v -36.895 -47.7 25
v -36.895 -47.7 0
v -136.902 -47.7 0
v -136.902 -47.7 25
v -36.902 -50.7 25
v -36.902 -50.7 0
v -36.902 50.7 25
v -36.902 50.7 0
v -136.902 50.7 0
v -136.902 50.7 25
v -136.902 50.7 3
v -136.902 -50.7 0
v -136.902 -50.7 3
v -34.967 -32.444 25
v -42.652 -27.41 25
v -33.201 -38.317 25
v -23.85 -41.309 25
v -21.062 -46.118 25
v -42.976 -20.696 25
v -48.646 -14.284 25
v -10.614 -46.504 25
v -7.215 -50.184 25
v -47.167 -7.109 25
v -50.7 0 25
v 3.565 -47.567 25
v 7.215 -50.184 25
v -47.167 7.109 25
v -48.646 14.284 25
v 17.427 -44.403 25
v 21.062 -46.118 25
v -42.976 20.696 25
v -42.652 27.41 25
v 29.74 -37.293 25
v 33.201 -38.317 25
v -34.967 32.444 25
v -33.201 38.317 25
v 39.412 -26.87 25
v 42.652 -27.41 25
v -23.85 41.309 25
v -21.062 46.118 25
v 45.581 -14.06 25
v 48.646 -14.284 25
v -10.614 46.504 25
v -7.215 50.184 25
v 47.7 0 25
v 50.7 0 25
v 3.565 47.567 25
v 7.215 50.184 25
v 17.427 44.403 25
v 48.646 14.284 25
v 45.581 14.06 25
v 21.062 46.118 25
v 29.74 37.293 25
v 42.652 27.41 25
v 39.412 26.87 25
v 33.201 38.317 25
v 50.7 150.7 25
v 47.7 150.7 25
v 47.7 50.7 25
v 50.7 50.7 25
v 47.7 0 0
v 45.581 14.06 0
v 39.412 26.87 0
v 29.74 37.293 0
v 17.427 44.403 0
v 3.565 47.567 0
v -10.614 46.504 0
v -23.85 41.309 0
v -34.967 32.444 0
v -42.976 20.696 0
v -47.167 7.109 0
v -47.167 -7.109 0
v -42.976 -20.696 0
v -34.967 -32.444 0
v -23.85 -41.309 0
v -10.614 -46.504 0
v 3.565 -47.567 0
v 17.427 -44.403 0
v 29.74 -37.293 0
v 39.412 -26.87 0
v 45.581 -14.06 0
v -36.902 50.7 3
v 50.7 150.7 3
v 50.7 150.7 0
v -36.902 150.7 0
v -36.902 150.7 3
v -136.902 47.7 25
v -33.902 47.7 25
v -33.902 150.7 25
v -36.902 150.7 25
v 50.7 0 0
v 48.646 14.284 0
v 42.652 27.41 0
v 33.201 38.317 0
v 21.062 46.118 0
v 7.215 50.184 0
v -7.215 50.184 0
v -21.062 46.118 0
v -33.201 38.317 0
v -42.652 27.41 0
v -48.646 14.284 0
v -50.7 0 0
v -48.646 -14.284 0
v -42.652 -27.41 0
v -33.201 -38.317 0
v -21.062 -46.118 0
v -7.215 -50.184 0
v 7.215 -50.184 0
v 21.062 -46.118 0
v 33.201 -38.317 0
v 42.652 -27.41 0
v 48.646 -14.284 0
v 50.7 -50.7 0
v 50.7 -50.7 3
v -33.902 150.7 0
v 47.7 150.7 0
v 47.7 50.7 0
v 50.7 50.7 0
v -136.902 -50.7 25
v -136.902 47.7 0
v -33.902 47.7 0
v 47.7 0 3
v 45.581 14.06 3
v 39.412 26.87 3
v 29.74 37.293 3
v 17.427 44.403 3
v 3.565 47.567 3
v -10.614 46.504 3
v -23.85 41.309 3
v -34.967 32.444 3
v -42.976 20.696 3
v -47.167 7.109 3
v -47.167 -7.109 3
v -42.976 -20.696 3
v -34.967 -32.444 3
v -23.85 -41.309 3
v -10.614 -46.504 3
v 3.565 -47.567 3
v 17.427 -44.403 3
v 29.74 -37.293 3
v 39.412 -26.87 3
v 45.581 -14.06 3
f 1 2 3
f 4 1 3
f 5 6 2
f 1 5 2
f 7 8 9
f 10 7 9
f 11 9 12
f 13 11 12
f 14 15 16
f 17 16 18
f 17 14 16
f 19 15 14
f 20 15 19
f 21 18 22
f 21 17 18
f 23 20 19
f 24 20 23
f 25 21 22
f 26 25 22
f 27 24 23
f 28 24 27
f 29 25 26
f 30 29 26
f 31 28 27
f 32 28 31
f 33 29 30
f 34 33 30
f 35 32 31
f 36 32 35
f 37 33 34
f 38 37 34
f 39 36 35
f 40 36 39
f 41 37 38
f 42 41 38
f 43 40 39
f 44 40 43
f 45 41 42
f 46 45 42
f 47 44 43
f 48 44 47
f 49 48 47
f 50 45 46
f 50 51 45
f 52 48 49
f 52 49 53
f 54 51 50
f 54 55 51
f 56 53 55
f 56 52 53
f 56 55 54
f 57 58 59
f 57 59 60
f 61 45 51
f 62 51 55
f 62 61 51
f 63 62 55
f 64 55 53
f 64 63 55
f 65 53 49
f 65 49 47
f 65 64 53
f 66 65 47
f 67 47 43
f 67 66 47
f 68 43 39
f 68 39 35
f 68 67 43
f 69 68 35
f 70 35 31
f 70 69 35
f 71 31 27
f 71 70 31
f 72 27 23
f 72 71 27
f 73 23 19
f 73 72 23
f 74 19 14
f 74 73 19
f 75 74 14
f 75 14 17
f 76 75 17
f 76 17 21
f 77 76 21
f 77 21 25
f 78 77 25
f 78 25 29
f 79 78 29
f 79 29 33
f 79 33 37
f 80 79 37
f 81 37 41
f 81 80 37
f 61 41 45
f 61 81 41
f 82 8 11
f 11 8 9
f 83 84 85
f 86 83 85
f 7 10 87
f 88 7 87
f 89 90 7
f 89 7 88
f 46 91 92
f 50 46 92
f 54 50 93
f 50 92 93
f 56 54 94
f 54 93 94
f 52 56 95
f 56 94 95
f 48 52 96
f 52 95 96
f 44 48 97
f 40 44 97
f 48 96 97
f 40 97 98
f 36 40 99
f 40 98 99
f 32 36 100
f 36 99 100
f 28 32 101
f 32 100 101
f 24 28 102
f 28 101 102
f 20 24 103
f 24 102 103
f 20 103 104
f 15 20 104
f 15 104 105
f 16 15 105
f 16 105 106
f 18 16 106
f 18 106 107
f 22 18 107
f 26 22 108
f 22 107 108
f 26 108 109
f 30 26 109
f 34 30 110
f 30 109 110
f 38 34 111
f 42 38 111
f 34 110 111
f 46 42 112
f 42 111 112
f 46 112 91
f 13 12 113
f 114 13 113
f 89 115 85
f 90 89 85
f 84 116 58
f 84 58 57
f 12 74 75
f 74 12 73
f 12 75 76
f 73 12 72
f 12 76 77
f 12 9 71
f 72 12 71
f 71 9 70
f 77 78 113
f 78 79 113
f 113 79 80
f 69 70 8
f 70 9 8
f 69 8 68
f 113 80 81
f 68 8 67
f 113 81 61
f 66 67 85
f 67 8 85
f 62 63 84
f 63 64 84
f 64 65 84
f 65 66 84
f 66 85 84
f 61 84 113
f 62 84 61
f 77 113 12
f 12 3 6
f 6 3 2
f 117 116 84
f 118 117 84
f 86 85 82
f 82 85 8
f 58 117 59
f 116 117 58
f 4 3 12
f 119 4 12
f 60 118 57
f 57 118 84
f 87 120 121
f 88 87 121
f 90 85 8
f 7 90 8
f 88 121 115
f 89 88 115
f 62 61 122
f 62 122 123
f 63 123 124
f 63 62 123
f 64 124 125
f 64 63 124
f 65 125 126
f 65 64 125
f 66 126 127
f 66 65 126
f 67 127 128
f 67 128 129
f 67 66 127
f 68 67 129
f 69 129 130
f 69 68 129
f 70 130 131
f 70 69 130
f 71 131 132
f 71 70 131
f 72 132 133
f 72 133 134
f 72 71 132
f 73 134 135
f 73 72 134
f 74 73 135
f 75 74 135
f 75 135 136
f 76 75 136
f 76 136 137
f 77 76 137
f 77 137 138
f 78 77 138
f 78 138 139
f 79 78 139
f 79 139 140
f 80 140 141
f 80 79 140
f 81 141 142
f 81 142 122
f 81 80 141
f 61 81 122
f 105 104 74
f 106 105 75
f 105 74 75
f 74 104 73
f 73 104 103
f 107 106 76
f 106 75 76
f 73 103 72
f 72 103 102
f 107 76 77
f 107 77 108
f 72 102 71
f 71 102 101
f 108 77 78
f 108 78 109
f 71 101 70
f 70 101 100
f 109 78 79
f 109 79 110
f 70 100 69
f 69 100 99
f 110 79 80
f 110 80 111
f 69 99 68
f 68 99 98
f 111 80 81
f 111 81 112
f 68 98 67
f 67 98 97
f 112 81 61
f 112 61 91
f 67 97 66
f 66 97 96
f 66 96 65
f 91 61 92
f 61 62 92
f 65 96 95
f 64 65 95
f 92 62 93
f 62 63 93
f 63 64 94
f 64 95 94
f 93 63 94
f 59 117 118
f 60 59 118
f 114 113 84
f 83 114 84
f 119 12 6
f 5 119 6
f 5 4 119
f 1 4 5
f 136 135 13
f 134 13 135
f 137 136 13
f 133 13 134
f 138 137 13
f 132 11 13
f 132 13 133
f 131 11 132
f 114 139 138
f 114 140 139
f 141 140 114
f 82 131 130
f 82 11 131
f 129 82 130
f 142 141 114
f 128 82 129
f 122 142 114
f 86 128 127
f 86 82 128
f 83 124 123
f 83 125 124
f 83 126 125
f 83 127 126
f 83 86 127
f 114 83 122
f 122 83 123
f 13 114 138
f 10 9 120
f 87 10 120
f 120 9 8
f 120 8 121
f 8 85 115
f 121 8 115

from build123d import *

# Parameters (mm, degrees)
F0_R     = 47.7
F1_DEPTH = 25
F0_W     = 3
F0_H     = 100
F2_DEPTH = 3


with BuildPart() as f1:
    # F0 (on Top) → F1 (new body)
    with BuildSketch(Plane.XY):
        with BuildLine():
            ThreePointArc((-4.79e-08, -50.7), (35.8503137892, -35.8503138231), (50.7, 0))
            ThreePointArc((50.7, 0), (-35.8503137892, 35.8503138231), (-4.79e-08, -50.7))
        make_face()
        Circle(F0_R, mode=Mode.SUBTRACT)
    extrude(amount=F1_DEPTH)


with BuildPart() as f1b:
    # F0 (on Top) → F1, piece 2 (new body)
    with BuildSketch(Plane.XY):
        Polygon((-33.9021371007, 47.7000079251), (-33.9021371007, 150.7), (-36.9021371007, 150.7), (-36.9021371007, 50.7), (-136.9021371007, 50.7), (-136.9021371007, 47.7000079251), (-36.8952414091, 47.7000079251), align=None)
    extrude(amount=F1_DEPTH)


with BuildPart() as f1c:
    # F0 (on Top) → F1, piece 3 (new body)
    with BuildSketch(Plane.XY):
        with Locations((49.2, 100.7)):
            Rectangle(F0_W, F0_H)
    extrude(amount=F1_DEPTH)


with BuildPart() as f1d:
    # F0 (on Top) → F1, piece 4 (new body)
    with BuildSketch(Plane.XY):
        Polygon((-136.9021371007, -50.7), (-36.9021371007, -50.7), (-36.8952414091, -47.7000079251), (-136.9021371007, -47.7000079251), align=None)
    extrude(amount=F1_DEPTH)


with BuildPart() as f2:
    # F0 (on Top) → F2 (new body)
    with BuildSketch(Plane.XY):
        with BuildLine():
            ThreePointArc((-4.79e-08, -50.7), (35.8503137892, -35.8503138231), (50.7, 0))
            ThreePointArc((50.7, 0), (-35.8503137892, 35.8503138231), (-4.79e-08, -50.7))
        make_face()
        Circle(F0_R, mode=Mode.SUBTRACT)
        with BuildLine():
            Line((50.7, -50.7), (50.7, 0))
            ThreePointArc((50.7, 0), (35.8503137892, -35.8503138231), (-4.79e-08, -50.7))
            Line((-4.79e-08, -50.7), (50.7, -50.7))
        make_face()
        with BuildLine():
            ThreePointArc((-4.79e-08, -50.7), (-35.8503137892, 35.8503138231), (50.7, 0))
            Line((50.7, 0), (50.7, 50.7))
            Line((50.7, 50.7), (47.7, 50.7))
            Line((47.7, 50.7), (47.7, 150.7))
            Line((47.7, 150.7), (-33.9021371007, 150.7))
            Line((-33.9021371007, 150.7), (-33.9021371007, 47.7000079251))
            Line((-33.9021371007, 47.7000079251), (-36.8952414091, 47.7000079251))
            Line((-36.8952414091, 47.7000079251), (-136.9021371007, 47.7000079251))
            Line((-136.9021371007, 47.7000079251), (-136.9021371007, -47.7000079251))
            Line((-136.9021371007, -47.7000079251), (-36.8952414091, -47.7000079251))
            Line((-36.8952414091, -47.7000079251), (-36.9021371007, -50.7))
            Line((-36.9021371007, -50.7), (-4.79e-08, -50.7))
        make_face()
        with Locations((49.2, 100.7)):
            Rectangle(F0_W, F0_H)
        Polygon((-136.9021371007, -50.7), (-36.9021371007, -50.7), (-36.8952414091, -47.7000079251), (-136.9021371007, -47.7000079251), align=None)
        Polygon((-33.9021371007, 47.7000079251), (-33.9021371007, 150.7), (-36.9021371007, 150.7), (-36.9021371007, 50.7), (-136.9021371007, 50.7), (-136.9021371007, 47.7000079251), (-36.8952414091, 47.7000079251), align=None)
    extrude(amount=F2_DEPTH)


solid = Compound([f1.part, f1b.part, f1c.part, f1d.part, f2.part])
